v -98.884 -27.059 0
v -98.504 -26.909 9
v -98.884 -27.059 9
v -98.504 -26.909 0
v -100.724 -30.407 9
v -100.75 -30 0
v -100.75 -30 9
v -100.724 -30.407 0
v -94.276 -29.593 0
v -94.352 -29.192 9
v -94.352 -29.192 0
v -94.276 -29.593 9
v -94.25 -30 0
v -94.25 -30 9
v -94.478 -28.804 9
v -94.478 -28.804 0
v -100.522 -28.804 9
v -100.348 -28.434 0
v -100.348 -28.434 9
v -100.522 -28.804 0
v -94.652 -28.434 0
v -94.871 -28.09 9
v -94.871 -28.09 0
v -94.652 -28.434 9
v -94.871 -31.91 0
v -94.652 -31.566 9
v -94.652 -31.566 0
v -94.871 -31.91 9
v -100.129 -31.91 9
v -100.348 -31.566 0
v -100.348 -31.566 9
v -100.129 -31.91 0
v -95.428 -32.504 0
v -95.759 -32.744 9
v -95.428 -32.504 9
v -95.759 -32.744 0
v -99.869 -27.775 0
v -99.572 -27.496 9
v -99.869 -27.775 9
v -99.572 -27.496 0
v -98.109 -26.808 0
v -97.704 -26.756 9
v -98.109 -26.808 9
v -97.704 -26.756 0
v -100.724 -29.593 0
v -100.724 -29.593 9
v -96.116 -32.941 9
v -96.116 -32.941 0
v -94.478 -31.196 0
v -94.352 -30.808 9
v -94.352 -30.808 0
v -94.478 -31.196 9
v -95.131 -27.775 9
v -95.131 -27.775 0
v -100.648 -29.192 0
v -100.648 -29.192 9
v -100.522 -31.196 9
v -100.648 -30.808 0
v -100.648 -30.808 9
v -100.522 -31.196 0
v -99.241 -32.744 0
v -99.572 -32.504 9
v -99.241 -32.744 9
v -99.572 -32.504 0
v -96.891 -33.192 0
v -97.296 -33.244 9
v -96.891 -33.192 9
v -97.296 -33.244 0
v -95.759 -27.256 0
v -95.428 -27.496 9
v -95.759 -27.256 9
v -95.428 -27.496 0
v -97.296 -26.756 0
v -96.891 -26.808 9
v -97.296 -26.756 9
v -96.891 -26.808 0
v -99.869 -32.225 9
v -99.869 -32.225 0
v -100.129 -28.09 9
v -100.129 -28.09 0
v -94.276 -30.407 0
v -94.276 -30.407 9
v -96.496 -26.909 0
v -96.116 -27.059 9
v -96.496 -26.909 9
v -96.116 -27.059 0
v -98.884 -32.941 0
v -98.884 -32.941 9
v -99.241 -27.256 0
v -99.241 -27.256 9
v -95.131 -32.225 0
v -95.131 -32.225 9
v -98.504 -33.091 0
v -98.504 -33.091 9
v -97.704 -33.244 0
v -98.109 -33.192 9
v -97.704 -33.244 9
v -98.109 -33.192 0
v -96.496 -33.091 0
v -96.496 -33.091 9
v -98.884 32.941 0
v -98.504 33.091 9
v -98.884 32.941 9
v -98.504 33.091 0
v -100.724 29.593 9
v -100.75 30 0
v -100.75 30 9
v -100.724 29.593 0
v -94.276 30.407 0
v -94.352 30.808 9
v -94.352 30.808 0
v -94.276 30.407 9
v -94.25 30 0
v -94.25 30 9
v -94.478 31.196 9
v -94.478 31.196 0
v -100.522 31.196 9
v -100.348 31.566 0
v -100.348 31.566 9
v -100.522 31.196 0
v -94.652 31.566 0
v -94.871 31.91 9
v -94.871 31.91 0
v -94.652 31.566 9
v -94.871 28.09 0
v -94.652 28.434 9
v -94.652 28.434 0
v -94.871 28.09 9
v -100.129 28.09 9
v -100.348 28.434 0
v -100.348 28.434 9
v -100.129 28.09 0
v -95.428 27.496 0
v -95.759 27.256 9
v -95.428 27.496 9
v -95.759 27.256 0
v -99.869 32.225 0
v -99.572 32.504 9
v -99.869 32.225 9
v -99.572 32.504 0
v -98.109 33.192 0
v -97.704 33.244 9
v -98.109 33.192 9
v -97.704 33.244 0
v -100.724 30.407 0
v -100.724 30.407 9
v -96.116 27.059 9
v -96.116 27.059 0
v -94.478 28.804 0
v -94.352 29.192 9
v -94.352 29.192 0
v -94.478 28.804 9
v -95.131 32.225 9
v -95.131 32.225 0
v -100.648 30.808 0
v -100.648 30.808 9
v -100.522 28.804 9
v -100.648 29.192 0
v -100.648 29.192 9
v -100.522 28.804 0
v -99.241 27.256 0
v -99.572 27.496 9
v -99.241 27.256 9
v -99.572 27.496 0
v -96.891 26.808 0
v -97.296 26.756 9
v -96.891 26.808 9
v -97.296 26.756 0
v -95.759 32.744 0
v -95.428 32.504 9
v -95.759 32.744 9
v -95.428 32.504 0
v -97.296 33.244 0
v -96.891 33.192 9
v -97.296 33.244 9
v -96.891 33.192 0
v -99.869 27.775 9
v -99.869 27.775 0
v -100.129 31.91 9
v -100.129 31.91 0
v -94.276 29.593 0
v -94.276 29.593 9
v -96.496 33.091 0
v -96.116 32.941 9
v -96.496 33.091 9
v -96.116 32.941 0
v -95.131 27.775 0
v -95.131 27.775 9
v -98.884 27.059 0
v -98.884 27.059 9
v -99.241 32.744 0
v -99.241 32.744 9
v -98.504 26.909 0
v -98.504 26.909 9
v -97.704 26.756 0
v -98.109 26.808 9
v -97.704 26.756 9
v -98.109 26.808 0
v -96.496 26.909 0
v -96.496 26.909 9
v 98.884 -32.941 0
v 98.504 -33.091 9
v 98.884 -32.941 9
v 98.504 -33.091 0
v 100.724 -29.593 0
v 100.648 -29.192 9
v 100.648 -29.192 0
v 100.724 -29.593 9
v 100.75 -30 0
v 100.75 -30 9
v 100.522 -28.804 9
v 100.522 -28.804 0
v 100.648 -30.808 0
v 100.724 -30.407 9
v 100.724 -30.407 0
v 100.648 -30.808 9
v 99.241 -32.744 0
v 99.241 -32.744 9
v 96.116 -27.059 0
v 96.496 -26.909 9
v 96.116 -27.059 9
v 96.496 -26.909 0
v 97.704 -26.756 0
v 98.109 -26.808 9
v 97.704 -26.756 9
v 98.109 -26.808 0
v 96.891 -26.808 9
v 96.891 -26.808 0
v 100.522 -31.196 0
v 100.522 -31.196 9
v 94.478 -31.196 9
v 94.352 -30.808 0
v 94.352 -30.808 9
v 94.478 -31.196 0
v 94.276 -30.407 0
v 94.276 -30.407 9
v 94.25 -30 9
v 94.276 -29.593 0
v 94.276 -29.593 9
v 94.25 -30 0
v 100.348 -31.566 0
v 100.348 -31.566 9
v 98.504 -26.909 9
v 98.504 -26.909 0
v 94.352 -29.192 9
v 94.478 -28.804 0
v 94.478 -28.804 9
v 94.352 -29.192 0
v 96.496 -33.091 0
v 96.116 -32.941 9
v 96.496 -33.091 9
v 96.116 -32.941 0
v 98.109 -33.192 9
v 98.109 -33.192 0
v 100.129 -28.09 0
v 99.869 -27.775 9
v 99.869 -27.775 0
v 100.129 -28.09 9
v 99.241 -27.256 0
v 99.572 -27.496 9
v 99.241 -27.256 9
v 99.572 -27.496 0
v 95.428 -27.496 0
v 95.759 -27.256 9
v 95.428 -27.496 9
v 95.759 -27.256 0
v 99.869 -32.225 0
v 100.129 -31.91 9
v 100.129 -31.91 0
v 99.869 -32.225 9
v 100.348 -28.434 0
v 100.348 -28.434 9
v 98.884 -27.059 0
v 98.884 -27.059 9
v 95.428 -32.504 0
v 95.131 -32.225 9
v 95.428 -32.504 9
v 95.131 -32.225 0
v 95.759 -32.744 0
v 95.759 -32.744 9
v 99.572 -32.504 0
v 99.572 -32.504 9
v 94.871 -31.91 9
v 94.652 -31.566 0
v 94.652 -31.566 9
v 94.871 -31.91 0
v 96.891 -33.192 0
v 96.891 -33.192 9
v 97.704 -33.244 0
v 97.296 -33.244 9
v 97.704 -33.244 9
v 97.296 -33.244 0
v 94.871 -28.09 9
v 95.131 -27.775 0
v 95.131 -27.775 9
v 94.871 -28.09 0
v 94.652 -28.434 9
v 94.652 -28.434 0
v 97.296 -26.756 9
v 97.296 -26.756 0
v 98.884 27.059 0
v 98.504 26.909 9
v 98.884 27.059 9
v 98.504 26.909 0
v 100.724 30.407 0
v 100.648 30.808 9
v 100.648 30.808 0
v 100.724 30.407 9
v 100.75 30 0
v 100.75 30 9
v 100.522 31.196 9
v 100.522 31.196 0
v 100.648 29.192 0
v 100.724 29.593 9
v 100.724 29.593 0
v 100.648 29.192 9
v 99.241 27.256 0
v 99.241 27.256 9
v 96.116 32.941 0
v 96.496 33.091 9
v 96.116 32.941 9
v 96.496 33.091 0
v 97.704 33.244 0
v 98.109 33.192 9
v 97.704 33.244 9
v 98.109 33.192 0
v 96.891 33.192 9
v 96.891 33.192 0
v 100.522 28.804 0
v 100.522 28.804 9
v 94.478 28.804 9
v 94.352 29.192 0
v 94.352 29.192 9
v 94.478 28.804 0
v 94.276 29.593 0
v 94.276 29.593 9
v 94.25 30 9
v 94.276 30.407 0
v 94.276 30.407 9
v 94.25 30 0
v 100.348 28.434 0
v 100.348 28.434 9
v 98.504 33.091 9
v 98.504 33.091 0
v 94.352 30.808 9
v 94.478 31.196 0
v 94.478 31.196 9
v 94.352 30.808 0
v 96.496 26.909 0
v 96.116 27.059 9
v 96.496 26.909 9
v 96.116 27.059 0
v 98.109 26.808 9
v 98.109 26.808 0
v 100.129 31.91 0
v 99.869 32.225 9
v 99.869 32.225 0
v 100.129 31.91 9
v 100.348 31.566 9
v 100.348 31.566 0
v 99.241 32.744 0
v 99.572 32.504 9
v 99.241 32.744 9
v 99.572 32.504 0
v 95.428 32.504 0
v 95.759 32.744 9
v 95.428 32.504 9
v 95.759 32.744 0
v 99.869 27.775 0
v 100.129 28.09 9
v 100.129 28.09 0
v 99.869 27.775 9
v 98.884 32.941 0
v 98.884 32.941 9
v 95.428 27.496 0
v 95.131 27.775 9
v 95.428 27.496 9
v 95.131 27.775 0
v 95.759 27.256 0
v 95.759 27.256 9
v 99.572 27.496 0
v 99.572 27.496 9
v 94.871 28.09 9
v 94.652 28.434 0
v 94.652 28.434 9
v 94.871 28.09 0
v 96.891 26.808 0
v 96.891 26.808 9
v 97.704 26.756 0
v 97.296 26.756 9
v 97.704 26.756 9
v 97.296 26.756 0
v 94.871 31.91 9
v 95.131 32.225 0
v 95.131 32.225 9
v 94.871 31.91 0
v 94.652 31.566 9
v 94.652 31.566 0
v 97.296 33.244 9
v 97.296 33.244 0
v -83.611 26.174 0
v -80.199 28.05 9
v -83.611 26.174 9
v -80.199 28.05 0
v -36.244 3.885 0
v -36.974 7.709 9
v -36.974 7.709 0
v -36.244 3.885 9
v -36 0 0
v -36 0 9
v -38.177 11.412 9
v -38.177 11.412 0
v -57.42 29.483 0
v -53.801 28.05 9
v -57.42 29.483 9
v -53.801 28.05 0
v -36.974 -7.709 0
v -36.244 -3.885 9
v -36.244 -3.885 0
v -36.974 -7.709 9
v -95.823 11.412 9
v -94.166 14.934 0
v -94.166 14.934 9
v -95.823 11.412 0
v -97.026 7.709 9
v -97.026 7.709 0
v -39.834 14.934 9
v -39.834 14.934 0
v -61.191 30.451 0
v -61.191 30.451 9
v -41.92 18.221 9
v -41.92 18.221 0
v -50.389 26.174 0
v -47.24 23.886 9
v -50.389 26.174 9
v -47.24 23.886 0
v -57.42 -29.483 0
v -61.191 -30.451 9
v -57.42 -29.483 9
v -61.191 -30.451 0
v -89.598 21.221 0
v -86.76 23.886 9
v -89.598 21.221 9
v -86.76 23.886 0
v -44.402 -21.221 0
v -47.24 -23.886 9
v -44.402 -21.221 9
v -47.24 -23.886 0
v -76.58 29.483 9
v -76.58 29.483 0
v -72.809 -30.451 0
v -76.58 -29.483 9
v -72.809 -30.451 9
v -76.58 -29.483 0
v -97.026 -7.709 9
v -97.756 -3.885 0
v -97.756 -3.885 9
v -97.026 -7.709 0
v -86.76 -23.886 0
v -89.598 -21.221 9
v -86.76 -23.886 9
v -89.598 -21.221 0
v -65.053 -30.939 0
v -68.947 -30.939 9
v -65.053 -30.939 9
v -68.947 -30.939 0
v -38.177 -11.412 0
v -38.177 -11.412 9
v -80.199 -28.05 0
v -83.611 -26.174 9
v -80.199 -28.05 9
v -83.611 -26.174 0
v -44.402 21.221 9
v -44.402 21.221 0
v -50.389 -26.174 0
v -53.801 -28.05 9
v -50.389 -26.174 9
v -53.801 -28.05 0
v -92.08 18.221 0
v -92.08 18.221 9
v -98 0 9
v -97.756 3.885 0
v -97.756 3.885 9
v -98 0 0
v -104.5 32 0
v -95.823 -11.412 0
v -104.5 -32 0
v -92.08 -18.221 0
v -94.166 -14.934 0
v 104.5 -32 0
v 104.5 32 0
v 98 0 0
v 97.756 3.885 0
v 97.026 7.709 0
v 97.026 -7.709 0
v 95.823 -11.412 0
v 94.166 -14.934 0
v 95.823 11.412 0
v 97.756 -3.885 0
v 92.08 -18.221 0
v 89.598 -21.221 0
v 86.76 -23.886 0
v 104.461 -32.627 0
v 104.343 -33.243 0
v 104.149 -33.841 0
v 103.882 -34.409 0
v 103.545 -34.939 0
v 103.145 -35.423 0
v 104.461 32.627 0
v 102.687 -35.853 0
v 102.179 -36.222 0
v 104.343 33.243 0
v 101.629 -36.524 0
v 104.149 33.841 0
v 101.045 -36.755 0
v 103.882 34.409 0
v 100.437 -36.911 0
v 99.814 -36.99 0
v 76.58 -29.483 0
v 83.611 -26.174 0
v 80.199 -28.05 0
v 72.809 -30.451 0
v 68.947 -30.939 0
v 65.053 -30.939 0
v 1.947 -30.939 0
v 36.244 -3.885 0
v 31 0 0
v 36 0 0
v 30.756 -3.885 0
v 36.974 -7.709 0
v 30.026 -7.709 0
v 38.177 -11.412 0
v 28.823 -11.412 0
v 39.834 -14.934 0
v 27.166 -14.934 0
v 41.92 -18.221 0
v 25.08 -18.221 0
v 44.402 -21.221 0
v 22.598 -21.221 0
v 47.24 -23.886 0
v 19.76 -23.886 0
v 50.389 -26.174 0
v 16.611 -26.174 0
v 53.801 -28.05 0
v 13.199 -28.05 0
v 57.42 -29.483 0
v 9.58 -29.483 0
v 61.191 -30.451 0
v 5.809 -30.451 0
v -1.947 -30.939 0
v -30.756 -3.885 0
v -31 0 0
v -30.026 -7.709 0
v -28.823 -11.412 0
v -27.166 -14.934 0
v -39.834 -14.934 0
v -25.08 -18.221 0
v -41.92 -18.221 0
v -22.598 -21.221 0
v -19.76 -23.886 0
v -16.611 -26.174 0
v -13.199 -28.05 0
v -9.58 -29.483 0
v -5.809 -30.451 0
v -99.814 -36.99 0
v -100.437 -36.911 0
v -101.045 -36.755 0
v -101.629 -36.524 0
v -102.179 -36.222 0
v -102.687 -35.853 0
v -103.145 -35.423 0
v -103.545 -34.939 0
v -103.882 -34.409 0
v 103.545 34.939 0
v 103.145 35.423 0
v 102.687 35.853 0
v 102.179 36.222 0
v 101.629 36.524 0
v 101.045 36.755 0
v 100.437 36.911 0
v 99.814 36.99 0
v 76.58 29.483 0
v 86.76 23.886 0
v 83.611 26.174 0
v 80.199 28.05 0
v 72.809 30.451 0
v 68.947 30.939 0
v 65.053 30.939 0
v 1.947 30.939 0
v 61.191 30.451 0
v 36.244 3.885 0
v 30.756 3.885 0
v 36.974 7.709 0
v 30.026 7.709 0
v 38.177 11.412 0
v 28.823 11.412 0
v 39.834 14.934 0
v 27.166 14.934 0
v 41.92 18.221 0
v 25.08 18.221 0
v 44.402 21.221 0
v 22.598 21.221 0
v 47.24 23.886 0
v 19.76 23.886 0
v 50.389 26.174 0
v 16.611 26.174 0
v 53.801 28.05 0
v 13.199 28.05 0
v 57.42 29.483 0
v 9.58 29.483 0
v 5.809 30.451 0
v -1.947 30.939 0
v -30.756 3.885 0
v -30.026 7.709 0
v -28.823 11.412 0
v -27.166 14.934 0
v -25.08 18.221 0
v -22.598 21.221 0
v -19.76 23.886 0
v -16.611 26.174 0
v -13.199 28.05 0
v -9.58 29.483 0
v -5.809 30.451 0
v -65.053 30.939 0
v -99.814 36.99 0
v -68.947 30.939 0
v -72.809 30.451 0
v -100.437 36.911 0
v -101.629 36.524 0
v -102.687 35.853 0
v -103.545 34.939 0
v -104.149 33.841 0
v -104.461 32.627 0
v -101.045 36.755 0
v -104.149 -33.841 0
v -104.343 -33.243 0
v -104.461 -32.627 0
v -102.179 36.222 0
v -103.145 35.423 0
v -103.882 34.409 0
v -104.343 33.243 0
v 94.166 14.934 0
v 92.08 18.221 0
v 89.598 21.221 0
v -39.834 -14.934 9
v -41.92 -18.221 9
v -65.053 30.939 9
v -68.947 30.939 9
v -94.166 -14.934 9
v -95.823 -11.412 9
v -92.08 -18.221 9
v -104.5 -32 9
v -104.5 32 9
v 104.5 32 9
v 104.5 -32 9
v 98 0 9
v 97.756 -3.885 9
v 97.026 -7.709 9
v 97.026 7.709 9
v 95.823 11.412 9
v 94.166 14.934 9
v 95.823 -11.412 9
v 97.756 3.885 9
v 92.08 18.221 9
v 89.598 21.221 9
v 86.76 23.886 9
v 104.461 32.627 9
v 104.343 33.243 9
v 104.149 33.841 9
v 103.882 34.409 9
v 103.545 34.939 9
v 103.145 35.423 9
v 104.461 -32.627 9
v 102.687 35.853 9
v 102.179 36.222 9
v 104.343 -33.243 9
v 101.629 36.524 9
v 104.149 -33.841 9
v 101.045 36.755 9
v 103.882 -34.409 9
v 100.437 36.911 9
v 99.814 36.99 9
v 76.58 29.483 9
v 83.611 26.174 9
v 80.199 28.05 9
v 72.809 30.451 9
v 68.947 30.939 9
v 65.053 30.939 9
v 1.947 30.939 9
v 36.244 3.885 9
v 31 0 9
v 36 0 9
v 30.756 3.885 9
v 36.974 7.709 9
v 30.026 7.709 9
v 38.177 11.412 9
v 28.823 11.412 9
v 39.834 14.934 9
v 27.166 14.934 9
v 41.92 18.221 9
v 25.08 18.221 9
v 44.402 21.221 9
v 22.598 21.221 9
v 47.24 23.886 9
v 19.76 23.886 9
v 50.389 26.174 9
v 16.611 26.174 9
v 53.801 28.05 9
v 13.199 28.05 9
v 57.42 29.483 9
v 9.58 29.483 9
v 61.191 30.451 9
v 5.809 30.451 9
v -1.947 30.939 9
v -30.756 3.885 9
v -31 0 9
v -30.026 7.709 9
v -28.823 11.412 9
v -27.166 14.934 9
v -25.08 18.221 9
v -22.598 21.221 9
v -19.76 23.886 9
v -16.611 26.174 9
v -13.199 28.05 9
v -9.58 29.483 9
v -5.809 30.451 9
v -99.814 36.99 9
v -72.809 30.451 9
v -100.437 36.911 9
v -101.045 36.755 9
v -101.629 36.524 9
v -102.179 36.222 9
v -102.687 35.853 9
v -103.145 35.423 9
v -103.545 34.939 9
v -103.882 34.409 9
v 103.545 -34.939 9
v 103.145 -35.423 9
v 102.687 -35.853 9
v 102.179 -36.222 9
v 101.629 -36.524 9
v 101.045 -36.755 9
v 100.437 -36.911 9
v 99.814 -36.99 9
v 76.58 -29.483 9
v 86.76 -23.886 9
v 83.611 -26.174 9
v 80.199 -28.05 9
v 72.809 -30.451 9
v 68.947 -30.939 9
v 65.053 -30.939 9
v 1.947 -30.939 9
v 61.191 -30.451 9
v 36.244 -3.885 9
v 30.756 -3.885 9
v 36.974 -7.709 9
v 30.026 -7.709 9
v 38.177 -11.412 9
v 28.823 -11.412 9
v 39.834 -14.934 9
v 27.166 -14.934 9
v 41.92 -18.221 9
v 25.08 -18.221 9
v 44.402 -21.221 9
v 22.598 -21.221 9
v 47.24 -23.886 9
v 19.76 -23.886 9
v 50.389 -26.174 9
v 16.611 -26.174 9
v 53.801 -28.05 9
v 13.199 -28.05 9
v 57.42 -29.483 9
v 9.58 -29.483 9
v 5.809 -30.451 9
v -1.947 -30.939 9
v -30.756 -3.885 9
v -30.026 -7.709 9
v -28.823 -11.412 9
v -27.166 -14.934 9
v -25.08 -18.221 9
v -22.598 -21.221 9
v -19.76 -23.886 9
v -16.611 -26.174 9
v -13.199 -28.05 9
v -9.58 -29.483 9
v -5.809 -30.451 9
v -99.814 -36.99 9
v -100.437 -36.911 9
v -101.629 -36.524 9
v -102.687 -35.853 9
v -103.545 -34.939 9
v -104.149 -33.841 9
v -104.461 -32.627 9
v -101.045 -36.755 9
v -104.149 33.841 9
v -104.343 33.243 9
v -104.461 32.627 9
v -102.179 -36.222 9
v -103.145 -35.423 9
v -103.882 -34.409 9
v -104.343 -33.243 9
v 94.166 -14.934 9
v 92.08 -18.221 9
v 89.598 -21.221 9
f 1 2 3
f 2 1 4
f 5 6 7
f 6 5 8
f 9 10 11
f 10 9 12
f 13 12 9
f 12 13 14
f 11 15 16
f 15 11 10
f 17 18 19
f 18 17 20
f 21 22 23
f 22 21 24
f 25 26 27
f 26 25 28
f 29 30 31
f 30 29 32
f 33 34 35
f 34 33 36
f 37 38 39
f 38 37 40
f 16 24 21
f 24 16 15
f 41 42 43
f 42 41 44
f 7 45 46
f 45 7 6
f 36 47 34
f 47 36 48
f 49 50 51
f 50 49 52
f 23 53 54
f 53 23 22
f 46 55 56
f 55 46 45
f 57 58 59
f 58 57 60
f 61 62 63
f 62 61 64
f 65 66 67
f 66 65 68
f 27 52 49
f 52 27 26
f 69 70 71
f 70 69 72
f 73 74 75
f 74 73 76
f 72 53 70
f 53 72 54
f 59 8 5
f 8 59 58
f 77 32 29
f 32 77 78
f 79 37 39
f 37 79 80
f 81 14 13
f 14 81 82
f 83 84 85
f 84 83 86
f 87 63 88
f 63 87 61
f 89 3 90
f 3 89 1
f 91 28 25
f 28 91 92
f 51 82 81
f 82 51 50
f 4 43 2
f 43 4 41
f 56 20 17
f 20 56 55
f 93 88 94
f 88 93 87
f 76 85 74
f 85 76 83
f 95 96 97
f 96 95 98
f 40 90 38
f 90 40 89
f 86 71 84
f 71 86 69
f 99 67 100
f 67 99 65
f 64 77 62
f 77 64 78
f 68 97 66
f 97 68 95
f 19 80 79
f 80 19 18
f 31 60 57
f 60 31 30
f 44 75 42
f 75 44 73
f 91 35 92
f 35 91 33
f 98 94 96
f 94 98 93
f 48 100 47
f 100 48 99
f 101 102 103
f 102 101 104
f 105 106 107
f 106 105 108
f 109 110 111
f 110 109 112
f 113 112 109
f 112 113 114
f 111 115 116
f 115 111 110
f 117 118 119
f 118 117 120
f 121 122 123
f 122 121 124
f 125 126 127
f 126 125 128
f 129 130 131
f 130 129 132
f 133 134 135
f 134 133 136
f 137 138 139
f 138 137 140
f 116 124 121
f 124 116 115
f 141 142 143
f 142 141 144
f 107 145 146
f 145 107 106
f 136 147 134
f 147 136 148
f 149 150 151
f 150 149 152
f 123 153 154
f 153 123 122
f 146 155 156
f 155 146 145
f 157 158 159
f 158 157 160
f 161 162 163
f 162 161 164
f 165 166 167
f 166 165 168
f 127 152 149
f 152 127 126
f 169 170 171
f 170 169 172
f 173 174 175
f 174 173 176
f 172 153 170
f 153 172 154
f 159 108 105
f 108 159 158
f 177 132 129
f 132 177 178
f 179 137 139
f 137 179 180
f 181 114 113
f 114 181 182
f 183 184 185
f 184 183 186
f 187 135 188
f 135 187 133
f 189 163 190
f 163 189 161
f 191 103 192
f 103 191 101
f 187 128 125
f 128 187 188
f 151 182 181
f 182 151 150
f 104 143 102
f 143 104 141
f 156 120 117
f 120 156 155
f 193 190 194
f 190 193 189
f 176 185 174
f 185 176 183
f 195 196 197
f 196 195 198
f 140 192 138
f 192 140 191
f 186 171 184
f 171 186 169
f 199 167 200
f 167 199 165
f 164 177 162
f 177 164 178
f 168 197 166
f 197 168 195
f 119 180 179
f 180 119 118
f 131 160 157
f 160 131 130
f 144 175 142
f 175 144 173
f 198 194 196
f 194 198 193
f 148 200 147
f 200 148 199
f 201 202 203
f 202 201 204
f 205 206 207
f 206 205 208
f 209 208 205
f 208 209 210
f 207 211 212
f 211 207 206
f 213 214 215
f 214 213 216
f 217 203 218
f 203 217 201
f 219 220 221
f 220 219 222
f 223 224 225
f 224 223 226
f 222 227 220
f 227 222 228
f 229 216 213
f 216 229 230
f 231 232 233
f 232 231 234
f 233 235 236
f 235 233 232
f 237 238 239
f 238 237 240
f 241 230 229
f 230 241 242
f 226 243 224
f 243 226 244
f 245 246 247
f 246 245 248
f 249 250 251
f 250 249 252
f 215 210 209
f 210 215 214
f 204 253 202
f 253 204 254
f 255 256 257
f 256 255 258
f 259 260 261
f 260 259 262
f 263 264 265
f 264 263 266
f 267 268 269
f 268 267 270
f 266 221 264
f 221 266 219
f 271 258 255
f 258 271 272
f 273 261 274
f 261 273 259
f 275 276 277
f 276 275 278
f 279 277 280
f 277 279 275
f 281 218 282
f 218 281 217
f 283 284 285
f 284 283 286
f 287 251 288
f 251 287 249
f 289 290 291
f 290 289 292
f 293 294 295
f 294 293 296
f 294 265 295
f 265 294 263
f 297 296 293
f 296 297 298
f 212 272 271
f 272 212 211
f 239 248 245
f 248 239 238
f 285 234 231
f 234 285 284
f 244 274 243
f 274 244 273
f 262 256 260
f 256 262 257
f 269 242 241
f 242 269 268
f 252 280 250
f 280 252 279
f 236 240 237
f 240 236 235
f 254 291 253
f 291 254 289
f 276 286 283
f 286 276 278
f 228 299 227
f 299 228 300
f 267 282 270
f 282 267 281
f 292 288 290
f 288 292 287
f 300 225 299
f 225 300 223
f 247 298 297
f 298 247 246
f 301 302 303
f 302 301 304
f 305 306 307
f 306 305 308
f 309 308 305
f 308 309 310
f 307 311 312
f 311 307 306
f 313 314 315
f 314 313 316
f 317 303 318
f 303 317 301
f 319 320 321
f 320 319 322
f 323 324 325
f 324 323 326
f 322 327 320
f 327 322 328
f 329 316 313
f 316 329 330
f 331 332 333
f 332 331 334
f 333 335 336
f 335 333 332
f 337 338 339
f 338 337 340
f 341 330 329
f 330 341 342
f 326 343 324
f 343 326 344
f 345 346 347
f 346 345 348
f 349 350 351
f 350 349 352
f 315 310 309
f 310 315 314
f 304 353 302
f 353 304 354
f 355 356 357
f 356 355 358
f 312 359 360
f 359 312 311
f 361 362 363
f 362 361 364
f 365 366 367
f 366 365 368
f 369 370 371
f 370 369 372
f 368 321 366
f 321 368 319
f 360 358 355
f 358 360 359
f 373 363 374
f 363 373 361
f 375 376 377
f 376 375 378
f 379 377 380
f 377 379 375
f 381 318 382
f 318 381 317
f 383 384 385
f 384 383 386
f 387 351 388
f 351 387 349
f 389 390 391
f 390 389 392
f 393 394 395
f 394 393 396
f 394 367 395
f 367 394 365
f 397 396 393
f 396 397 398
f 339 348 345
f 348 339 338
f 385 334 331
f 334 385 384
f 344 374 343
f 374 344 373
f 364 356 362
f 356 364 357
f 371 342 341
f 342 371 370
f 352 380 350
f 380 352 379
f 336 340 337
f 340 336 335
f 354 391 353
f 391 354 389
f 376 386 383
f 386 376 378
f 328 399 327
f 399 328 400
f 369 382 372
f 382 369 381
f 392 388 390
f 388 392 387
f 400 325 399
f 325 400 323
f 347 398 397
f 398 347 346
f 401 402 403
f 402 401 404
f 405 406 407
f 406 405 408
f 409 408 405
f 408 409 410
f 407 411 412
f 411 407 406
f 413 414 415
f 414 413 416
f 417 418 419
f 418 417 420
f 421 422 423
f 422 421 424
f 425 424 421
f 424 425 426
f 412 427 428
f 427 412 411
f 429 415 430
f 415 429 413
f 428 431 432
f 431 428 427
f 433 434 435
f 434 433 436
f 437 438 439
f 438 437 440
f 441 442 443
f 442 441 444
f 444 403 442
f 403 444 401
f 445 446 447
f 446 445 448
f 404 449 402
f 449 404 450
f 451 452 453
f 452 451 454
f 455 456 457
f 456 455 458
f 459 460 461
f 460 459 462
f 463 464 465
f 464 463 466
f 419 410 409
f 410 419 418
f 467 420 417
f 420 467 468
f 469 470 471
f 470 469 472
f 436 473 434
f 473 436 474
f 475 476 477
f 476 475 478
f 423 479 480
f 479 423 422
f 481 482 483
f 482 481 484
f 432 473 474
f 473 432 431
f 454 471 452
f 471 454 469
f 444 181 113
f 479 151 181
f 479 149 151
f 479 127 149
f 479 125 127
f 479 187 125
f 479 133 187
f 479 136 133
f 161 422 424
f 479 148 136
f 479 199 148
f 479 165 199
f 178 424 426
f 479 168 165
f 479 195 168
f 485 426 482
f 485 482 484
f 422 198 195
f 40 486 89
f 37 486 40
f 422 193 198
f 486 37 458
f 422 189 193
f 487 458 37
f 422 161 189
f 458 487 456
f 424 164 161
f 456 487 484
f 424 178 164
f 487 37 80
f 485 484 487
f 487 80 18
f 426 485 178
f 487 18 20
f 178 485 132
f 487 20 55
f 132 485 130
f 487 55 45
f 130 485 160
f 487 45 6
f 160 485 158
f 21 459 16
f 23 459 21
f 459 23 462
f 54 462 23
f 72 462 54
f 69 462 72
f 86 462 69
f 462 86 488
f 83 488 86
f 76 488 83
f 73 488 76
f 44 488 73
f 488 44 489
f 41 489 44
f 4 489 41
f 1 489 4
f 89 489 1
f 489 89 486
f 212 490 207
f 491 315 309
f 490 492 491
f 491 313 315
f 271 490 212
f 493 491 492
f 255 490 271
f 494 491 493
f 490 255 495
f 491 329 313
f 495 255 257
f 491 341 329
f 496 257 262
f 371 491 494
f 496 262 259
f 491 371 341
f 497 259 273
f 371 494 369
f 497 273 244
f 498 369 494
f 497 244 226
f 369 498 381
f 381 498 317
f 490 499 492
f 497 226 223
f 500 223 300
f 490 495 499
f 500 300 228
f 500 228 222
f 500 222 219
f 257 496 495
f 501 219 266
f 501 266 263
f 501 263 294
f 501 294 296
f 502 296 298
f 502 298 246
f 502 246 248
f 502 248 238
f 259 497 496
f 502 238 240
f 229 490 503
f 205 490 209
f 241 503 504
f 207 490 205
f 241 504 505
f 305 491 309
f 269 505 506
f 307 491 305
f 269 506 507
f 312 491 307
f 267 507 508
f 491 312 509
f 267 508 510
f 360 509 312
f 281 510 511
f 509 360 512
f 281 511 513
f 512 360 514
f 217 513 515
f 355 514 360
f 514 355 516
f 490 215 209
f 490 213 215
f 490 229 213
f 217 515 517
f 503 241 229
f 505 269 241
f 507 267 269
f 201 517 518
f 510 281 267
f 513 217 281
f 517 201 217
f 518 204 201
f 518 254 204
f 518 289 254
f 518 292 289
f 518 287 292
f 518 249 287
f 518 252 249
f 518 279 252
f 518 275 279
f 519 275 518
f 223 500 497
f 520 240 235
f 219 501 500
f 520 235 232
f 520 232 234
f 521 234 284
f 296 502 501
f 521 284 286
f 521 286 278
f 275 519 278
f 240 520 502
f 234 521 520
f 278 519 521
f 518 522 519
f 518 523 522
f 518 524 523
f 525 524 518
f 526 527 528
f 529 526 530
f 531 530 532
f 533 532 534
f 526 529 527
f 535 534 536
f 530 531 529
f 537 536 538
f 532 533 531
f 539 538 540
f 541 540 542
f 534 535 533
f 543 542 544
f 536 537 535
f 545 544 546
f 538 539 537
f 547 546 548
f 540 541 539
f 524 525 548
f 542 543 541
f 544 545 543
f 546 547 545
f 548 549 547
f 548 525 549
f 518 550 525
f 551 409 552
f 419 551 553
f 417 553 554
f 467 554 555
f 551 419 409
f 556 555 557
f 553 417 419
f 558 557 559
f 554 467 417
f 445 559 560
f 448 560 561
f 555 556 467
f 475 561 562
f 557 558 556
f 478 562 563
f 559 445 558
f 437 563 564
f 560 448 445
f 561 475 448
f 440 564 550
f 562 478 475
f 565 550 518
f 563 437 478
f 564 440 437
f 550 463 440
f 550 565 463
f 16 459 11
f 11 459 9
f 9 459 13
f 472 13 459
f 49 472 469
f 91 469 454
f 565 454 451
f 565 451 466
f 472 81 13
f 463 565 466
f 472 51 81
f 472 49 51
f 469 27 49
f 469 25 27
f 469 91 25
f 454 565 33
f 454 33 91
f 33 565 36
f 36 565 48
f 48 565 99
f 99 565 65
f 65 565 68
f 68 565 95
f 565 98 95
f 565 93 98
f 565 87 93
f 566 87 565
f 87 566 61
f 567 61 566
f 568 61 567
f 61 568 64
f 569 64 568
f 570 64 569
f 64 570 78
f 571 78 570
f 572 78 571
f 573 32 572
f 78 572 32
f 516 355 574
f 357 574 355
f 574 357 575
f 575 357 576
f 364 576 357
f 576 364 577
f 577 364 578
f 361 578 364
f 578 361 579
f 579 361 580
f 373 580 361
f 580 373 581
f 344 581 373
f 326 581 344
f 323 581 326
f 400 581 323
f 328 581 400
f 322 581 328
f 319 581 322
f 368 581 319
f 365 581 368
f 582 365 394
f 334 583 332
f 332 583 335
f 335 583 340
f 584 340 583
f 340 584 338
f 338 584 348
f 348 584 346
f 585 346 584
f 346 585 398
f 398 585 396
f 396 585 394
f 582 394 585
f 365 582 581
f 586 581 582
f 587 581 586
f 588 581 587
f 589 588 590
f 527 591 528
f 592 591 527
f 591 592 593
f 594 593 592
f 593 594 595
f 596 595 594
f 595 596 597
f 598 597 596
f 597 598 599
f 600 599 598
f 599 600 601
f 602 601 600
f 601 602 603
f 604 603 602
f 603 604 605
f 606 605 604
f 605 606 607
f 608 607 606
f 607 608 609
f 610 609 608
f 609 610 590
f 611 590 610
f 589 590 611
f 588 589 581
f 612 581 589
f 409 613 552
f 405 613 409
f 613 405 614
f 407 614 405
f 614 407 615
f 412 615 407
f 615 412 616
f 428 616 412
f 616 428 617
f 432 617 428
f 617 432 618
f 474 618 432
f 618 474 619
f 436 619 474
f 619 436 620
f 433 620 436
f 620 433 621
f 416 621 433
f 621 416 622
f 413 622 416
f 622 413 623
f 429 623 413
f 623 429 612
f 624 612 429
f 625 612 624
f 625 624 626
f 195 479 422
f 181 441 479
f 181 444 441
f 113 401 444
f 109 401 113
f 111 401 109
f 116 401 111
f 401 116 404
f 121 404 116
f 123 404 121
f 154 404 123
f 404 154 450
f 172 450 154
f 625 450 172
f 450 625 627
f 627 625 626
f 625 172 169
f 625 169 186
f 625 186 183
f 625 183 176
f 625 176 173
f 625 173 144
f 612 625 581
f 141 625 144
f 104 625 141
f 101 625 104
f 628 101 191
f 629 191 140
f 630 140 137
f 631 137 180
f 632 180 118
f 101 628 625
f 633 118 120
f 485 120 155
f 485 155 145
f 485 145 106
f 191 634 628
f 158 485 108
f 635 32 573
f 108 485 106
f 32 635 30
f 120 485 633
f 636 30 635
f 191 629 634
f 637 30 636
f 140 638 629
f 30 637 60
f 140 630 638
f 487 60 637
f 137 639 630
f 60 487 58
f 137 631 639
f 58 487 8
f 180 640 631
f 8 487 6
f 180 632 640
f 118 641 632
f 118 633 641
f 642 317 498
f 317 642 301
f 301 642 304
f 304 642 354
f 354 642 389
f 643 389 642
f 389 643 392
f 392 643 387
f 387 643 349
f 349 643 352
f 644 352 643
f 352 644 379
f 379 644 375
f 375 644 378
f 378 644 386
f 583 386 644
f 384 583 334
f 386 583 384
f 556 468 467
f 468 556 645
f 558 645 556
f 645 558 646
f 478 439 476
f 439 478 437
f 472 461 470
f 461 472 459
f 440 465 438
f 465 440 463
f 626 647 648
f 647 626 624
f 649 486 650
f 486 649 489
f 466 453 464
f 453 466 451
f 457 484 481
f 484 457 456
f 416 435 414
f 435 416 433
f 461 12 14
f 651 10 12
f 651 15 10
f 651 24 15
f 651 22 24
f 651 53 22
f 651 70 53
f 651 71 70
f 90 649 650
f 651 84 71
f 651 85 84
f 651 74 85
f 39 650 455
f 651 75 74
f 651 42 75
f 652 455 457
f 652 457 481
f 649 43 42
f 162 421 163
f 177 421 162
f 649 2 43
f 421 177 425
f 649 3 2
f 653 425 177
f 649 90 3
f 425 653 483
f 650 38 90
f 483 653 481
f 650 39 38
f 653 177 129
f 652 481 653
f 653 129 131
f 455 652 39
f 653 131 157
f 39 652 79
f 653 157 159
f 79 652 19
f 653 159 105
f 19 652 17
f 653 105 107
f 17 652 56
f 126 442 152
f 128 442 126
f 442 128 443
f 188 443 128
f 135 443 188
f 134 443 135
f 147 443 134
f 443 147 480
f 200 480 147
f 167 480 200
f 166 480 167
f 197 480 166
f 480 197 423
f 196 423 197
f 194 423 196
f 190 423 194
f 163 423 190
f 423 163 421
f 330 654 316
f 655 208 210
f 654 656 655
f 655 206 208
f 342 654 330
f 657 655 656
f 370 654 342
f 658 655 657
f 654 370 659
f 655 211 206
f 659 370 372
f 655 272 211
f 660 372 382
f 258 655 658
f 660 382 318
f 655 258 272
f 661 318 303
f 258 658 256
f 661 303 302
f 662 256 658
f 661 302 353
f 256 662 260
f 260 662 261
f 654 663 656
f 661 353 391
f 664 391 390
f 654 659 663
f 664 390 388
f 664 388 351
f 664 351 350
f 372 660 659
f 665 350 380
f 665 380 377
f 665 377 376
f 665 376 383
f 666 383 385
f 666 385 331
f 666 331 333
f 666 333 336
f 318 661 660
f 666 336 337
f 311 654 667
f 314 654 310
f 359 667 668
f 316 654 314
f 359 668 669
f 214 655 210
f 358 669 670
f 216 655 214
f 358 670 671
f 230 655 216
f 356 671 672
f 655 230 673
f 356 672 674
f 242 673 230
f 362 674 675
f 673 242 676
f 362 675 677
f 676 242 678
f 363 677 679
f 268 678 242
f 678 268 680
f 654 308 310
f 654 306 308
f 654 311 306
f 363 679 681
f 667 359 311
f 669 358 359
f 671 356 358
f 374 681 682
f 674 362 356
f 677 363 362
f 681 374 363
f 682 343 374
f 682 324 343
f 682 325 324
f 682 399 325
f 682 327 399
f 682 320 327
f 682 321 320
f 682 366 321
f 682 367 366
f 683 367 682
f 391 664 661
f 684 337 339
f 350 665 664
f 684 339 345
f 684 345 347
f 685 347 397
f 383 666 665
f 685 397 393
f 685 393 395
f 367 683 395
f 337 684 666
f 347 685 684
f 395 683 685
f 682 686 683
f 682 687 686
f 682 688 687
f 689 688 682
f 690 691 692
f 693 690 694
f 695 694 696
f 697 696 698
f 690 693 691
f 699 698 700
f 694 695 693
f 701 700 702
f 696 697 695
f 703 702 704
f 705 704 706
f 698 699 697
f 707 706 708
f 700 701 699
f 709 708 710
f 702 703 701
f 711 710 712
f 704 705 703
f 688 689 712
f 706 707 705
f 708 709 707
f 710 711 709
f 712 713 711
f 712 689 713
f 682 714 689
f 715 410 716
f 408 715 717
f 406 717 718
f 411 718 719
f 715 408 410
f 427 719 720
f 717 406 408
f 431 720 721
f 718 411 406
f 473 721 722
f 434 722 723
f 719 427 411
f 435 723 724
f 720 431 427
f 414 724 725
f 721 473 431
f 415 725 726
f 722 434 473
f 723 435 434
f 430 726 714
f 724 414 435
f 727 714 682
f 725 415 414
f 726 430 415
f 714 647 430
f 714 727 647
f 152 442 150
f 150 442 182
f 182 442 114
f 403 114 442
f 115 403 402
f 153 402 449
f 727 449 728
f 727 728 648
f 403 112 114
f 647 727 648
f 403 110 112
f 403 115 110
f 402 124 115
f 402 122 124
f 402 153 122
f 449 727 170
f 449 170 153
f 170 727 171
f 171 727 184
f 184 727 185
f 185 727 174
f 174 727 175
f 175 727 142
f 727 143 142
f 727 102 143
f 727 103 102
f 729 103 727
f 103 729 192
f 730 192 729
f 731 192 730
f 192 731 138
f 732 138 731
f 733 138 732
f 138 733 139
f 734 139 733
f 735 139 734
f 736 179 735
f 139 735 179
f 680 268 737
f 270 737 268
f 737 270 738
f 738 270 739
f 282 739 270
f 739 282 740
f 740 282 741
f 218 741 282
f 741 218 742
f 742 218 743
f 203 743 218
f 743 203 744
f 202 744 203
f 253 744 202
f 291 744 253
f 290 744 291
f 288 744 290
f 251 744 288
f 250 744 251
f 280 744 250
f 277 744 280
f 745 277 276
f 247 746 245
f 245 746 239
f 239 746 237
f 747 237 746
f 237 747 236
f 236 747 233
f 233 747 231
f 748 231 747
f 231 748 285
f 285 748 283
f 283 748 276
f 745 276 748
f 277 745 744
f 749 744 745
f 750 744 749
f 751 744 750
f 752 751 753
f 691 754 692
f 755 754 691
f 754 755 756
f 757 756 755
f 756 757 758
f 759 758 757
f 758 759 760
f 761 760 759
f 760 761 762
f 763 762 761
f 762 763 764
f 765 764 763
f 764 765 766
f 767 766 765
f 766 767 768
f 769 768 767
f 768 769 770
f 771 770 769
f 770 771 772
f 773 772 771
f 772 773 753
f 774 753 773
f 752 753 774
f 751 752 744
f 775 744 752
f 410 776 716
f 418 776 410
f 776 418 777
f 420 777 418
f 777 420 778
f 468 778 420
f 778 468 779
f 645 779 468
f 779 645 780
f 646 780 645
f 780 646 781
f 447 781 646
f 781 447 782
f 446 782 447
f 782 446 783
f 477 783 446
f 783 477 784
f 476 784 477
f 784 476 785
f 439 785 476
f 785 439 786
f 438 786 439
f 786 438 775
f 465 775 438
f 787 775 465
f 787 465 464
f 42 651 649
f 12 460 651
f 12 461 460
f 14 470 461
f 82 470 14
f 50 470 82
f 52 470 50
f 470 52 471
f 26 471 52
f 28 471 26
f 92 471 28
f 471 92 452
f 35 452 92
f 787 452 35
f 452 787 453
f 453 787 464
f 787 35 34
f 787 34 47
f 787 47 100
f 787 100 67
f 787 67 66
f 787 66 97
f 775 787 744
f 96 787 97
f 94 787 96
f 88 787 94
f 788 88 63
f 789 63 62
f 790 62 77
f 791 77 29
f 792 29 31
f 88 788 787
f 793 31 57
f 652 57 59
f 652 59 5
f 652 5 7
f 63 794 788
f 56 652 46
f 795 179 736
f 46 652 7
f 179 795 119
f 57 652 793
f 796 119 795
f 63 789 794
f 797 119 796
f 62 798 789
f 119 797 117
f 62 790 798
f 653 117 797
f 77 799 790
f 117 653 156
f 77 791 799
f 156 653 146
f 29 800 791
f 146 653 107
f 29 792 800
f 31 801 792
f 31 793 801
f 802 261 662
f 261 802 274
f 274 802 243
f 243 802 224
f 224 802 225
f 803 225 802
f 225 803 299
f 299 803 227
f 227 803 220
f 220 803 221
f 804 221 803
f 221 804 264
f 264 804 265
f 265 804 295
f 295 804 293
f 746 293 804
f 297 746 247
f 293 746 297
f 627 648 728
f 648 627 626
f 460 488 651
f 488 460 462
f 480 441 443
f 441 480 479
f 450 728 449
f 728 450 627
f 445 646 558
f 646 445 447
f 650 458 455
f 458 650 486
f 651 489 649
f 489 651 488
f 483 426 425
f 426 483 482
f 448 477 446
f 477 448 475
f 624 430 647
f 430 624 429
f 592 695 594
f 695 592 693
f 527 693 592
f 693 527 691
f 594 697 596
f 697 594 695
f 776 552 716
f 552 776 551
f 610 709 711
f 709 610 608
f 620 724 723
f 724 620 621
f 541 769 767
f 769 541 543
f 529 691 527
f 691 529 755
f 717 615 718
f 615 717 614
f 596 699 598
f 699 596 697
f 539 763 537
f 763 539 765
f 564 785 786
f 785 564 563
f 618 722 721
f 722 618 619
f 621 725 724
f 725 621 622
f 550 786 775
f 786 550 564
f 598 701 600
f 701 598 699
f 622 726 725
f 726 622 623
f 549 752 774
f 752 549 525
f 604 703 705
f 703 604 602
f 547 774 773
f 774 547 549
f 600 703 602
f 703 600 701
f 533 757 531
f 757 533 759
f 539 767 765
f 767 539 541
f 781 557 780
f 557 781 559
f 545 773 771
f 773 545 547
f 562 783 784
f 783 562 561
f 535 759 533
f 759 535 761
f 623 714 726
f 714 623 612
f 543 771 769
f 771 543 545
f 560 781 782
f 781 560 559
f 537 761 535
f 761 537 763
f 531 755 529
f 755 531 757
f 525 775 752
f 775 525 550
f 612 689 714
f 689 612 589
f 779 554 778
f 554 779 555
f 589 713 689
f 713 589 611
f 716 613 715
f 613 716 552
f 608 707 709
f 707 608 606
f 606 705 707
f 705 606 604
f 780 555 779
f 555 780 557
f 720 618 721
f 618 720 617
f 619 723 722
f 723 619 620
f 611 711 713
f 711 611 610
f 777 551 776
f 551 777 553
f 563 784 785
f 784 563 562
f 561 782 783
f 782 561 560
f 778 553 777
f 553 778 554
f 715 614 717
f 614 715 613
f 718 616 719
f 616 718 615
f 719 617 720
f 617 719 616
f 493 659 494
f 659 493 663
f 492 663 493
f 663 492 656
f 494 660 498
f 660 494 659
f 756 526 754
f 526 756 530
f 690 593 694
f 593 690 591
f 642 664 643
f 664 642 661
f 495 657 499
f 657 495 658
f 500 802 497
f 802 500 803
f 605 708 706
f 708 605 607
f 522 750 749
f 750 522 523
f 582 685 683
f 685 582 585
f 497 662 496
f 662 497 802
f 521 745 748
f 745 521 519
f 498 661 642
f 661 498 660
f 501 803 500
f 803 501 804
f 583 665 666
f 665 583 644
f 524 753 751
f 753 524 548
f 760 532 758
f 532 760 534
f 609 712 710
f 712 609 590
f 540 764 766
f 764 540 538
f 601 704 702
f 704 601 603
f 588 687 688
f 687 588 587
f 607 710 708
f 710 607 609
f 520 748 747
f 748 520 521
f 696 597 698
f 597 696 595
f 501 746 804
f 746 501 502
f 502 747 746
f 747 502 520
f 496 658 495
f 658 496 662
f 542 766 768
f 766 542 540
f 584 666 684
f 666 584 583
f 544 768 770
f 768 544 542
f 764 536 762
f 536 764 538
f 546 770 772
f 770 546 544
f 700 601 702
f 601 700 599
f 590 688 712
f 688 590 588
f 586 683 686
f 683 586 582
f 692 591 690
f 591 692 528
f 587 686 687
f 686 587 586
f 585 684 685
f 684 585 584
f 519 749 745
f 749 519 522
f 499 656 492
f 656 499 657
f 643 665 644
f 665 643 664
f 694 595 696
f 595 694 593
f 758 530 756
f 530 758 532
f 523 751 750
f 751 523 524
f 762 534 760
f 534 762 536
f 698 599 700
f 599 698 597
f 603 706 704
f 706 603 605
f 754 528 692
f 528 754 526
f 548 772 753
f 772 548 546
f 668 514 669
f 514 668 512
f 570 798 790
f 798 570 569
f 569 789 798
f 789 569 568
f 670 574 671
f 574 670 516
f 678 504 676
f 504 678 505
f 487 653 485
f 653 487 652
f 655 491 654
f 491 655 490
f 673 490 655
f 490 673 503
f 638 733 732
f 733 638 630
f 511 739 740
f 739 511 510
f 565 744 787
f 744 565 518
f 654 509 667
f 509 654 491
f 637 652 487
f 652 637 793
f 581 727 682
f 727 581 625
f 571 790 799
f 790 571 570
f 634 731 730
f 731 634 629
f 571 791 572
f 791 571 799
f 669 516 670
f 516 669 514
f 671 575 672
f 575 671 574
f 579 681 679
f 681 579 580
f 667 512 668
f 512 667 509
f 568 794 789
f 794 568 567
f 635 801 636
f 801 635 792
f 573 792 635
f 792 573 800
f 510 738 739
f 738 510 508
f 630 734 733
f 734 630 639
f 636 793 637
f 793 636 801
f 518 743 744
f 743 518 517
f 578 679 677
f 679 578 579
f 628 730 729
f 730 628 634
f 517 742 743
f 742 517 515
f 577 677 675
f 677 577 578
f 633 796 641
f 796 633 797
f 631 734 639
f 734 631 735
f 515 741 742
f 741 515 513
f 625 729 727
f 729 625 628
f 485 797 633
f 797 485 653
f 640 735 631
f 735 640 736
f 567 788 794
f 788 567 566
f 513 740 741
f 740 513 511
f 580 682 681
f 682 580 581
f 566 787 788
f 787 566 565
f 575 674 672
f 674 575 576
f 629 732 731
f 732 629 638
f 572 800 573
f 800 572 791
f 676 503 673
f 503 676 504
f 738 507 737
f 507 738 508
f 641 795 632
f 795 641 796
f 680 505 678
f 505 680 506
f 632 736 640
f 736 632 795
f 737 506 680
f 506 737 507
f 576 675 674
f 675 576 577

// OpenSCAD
$fn = 50;


difference() {
	union() {
		hull() {
			translate(v = [-99.5000000000, 32.0000000000, 0]) {
				cylinder(h = 9, r = 5);
			}
			translate(v = [99.5000000000, 32.0000000000, 0]) {
				cylinder(h = 9, r = 5);
			}
			translate(v = [-99.5000000000, -32.0000000000, 0]) {
				cylinder(h = 9, r = 5);
			}
			translate(v = [99.5000000000, -32.0000000000, 0]) {
				cylinder(h = 9, r = 5);
			}
		}
	}
	union() {
		#translate(v = [-97.5000000000, -30.0000000000, -100.0000000000]) {
			cylinder(h = 200, r = 3.2500000000);
		}
		#translate(v = [-97.5000000000, 30.0000000000, -100.0000000000]) {
			cylinder(h = 200, r = 3.2500000000);
		}
		#translate(v = [97.5000000000, -30.0000000000, -100.0000000000]) {
			cylinder(h = 200, r = 3.2500000000);
		}
		#translate(v = [97.5000000000, 30.0000000000, -100.0000000000]) {
			cylinder(h = 200, r = 3.2500000000);
		}
		#translate(v = [-67.0000000000, 0, 0]) {
			cylinder(h = 9, r = 31.0000000000);
		}
		#cylinder(h = 9, r = 31.0000000000);
		#translate(v = [67.0000000000, 0, 0]) {
			cylinder(h = 9, r = 31.0000000000);
		}
	}
}
